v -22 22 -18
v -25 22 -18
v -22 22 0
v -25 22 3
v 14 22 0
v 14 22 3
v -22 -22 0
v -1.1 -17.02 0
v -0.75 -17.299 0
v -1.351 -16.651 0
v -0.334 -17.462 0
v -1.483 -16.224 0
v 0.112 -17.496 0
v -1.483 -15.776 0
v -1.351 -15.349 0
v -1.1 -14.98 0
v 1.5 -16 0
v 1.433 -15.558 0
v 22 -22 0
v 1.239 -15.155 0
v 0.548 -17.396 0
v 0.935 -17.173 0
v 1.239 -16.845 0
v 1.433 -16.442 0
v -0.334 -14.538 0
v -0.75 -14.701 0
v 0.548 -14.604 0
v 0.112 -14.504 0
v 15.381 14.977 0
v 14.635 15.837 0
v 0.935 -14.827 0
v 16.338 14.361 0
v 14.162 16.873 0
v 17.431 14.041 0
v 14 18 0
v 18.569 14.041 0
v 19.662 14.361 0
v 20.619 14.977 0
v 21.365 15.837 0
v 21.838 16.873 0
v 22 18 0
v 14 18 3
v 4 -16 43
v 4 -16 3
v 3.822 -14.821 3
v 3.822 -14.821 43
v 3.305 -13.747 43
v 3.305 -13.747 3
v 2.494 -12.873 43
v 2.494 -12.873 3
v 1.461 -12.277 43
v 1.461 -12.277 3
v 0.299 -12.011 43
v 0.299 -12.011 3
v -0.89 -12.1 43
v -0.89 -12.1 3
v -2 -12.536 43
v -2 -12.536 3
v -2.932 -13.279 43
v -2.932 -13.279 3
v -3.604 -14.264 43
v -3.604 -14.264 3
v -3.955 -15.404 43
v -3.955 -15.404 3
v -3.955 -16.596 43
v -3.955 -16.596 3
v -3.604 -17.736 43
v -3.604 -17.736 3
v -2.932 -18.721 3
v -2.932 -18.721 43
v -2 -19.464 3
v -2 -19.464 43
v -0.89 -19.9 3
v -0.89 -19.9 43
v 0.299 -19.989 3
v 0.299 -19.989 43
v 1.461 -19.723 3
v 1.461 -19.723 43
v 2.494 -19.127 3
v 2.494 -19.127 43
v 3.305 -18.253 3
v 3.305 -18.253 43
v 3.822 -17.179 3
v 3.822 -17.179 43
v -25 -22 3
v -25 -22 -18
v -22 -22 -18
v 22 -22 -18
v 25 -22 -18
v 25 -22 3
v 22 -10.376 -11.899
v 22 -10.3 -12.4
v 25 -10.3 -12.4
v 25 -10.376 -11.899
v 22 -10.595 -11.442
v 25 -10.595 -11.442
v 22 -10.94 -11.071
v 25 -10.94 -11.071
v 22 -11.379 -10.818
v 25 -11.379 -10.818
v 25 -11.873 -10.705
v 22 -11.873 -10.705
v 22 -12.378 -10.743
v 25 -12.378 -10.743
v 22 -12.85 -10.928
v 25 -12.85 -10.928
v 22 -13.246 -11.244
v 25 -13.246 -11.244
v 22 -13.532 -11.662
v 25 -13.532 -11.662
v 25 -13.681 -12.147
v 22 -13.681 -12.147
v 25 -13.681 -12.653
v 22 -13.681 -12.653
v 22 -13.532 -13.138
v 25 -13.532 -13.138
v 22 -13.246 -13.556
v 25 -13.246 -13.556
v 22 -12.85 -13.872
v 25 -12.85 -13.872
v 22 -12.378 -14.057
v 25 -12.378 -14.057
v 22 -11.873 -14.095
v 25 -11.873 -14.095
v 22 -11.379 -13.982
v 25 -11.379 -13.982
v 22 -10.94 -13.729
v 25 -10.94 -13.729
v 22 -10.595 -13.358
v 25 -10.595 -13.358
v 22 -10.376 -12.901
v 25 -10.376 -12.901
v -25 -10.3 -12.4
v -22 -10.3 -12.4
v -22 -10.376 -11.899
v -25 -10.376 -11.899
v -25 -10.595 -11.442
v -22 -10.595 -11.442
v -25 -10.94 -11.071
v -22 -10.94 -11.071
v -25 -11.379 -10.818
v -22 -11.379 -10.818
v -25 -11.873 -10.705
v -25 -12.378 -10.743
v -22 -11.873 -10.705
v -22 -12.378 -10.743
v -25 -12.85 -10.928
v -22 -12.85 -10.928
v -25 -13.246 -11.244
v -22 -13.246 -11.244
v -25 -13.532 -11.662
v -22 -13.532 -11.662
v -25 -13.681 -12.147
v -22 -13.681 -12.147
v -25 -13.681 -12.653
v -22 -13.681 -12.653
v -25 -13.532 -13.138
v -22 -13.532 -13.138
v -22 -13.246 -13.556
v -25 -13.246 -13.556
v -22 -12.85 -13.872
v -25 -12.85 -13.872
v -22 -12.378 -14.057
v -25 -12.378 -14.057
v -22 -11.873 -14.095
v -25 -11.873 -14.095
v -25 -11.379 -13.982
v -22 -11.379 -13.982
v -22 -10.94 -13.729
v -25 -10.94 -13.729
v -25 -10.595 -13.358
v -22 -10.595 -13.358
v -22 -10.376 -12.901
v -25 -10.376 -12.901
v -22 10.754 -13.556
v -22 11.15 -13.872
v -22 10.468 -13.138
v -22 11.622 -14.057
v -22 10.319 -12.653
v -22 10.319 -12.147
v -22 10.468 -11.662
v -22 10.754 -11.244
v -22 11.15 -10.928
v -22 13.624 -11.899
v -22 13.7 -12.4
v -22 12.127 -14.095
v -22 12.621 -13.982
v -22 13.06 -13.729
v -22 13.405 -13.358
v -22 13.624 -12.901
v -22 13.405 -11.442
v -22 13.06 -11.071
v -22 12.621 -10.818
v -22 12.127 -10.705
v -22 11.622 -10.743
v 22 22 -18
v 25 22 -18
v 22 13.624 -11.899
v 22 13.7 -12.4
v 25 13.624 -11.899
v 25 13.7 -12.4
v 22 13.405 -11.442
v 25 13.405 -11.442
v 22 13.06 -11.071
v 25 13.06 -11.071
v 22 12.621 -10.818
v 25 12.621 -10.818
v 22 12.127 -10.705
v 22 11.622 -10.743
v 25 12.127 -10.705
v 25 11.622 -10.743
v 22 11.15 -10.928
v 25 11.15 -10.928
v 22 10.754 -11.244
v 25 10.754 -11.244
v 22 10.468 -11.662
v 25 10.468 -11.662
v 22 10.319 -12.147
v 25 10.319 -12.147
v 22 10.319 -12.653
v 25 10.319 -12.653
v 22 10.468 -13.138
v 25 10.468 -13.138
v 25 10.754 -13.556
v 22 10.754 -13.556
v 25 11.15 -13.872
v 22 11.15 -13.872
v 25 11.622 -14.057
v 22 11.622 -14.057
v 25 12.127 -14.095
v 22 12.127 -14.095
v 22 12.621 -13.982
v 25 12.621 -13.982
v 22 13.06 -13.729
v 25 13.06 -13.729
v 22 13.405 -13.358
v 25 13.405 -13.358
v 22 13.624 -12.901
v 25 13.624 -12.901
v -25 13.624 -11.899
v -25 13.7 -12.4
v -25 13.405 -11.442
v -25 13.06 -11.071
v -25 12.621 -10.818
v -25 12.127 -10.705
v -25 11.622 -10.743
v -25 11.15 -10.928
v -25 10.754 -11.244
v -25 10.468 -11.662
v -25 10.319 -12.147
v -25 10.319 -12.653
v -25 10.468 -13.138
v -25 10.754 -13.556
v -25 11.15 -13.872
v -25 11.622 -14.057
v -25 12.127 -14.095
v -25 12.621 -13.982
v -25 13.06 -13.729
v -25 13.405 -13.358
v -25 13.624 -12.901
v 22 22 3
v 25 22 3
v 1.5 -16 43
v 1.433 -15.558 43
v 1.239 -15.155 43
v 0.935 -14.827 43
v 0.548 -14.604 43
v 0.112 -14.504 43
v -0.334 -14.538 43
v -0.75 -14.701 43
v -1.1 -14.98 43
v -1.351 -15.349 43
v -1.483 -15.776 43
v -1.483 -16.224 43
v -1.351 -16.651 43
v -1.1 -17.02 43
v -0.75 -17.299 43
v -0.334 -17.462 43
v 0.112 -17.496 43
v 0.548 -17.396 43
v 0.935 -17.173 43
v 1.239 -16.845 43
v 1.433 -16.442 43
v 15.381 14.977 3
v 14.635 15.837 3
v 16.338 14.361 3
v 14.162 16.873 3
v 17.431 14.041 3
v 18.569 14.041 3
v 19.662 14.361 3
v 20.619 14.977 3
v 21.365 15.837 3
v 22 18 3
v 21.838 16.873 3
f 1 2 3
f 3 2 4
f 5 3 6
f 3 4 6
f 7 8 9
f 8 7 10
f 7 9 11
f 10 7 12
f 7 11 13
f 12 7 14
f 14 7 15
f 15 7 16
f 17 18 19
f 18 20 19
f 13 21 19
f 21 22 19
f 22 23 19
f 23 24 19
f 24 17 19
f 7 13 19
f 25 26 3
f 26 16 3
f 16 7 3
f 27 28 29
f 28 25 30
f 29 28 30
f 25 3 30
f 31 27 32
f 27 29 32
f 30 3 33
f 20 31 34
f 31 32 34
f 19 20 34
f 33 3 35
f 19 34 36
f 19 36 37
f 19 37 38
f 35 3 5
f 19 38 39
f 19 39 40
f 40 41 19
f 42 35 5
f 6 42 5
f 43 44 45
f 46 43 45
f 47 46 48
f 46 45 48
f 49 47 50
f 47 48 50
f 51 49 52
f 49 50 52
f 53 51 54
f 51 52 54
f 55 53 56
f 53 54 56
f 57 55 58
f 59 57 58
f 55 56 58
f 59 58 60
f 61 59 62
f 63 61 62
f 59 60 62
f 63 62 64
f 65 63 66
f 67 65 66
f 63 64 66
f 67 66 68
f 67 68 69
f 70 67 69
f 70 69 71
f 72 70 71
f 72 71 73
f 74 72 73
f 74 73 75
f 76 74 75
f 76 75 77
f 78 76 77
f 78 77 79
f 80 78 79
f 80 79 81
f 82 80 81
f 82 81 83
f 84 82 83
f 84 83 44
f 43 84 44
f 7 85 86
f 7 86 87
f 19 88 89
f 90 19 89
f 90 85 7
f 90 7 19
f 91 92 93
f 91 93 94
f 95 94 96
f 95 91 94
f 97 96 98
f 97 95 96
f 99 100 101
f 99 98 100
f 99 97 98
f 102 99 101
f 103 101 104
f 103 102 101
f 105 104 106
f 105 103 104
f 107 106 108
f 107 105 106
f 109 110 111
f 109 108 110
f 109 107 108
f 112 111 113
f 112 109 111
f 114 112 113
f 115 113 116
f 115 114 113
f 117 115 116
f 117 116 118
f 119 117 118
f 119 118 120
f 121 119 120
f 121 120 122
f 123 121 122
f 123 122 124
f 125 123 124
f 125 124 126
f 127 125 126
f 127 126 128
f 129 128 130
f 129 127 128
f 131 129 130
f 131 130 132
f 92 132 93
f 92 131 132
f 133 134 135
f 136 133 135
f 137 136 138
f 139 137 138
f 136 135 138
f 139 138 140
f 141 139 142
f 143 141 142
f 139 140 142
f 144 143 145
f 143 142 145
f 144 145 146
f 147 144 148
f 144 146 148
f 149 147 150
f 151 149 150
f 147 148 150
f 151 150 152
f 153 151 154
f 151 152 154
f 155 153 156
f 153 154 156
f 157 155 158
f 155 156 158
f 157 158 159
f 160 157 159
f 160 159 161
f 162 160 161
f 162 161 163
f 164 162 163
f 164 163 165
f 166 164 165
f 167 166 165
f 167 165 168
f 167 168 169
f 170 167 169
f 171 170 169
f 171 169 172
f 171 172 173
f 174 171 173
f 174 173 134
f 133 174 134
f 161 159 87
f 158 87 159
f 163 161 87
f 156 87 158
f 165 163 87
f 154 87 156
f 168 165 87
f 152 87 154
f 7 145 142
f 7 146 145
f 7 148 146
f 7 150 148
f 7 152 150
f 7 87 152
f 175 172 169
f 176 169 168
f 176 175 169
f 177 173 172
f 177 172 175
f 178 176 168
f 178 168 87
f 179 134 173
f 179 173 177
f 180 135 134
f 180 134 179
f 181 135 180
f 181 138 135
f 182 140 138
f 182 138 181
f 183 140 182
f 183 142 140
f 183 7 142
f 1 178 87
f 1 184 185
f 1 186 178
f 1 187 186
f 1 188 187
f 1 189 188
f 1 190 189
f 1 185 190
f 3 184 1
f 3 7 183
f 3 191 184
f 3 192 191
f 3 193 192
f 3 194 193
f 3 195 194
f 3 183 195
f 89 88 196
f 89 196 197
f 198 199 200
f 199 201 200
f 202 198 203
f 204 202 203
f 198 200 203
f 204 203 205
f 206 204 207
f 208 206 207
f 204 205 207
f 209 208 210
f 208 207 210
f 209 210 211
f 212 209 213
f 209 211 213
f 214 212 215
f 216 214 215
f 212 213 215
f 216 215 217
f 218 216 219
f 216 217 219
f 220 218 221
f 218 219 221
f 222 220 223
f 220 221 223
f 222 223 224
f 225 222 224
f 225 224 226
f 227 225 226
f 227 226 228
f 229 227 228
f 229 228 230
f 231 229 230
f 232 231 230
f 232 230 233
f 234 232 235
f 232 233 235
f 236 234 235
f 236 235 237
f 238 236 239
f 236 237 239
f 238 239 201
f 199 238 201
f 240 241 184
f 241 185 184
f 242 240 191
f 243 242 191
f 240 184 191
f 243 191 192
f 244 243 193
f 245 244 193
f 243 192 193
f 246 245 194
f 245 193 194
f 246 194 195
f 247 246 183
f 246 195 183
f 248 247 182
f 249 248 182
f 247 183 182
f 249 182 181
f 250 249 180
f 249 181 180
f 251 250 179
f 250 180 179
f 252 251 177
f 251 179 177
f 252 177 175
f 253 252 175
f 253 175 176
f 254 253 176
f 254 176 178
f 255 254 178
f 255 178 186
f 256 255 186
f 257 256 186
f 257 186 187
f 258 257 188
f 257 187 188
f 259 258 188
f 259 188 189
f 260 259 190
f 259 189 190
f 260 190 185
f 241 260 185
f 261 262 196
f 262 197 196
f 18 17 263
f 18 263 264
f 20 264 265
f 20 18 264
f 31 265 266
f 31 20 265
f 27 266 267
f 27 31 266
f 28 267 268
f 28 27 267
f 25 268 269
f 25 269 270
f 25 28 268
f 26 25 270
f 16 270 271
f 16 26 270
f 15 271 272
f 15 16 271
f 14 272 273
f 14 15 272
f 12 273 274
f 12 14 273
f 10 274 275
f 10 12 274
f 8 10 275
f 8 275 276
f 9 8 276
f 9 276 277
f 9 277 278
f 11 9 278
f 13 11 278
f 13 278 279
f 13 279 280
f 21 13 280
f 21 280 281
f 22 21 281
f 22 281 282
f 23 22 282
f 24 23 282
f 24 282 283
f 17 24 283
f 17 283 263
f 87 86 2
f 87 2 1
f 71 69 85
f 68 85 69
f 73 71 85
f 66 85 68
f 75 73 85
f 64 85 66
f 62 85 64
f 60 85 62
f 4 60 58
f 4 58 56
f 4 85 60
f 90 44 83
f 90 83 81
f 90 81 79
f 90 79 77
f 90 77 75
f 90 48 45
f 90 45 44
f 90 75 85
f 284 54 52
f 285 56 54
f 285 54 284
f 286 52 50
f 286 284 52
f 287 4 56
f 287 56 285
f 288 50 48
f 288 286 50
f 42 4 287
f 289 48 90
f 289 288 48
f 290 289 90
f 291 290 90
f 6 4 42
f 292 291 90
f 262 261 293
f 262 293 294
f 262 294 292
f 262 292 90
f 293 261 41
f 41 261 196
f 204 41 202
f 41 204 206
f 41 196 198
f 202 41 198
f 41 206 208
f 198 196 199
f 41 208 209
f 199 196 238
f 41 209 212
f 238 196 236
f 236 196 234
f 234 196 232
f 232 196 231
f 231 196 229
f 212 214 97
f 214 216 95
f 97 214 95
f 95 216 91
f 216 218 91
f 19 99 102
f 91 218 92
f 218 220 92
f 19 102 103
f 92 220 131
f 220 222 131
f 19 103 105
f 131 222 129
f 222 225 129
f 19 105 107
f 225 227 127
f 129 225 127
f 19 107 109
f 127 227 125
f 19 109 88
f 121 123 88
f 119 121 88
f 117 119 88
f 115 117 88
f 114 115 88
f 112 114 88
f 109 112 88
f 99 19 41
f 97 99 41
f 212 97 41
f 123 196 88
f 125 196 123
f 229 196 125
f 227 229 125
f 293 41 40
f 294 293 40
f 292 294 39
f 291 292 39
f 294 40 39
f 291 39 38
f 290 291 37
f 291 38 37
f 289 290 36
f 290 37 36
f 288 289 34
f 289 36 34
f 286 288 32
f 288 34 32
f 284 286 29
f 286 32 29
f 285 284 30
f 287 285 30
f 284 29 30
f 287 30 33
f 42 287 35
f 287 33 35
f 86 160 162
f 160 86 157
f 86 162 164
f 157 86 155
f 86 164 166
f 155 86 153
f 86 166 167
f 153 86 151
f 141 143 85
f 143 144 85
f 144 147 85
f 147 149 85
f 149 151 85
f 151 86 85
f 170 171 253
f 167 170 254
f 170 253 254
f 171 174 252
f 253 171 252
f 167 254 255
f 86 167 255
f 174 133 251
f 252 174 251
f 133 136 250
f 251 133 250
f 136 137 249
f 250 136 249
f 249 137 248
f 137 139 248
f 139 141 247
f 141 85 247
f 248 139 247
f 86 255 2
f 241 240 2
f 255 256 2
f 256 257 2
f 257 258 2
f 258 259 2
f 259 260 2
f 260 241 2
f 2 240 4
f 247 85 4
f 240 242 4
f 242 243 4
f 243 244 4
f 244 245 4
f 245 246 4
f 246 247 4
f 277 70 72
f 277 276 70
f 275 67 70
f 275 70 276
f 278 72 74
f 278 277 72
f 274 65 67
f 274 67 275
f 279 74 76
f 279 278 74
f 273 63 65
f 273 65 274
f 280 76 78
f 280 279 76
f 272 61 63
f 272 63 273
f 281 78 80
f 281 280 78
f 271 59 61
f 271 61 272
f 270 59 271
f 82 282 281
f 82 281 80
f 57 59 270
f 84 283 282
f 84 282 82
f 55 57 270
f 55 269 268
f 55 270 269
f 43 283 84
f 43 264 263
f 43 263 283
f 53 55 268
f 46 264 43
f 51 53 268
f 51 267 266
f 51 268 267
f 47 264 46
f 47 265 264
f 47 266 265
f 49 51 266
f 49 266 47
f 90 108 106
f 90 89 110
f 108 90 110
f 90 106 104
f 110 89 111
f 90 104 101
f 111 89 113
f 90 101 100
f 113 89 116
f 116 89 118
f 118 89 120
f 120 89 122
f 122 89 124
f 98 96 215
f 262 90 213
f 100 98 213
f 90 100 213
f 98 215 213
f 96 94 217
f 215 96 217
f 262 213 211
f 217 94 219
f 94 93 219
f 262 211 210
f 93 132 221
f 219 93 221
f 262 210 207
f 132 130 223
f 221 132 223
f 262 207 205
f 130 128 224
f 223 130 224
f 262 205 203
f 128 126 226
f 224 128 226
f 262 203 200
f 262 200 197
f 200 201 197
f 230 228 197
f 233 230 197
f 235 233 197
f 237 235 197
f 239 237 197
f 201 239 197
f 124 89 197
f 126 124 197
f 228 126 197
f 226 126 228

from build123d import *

# Parameters (mm, degrees)
F0_R     = 4
F0_W     = 3
F0_H     = 44
F0_R_2   = 1.5
F1_DEPTH = 3
F2_DEPTH = 18
F3_R     = 1.7
F4_DEPTH = 50
F5_DEPTH = 43


# Not quite as in the source:
# - a feature names something its author has since deleted; it is built from what else it names


with BuildPart() as f1:
    # F0 (on Top) → F1 (new body)
    with BuildSketch(Plane.XY):
        with BuildLine():
            Line((14, 22), (-22, 22))
            Line((-22, 22), (-22, -22))
            Line((-22, -22), (22, -22))
            Line((22, -22), (22, 18))
            ThreePointArc((22, 18), (18, 14), (14, 18))
            Line((14, 18), (14, 18.3849148452))
            Line((14, 18.3849148452), (14, 22))
        make_face()
        with Locations((0, -16)):
            Circle(F0_R, mode=Mode.SUBTRACT)
        with Locations((-23.5, 0)):
            Rectangle(F0_W, F0_H)
        Polygon((22, 18), (22, -22), (25, -22), (25, 22), (22, 22), align=None)
        with Locations((0, -16)):
            Circle(F0_R)
        with Locations((0, -16)):
            Circle(F0_R_2, mode=Mode.SUBTRACT)
    extrude(amount=F1_DEPTH)

    # F0 (on Top) → F2 (join)
    with BuildSketch(Plane.XY):
        with Locations((-23.5, 0)):
            Rectangle(F0_W, F0_H)
        Polygon((22, 18), (22, -22), (25, -22), (25, 22), (22, 22), align=None)
    extrude(amount=-F2_DEPTH)

    # F3 (on face) → F4 (cut, symmetric)
    with BuildSketch(Plane.YZ.offset(-22)):
        with Locations((-12, -12.4)):
            Circle(F3_R)
        with Locations((12, -12.4)):
            Circle(F3_R)
    extrude(amount=F4_DEPTH, both=True, mode=Mode.SUBTRACT)

    # F0 (on Top) → F5 (join)
    with BuildSketch(Plane.XY):
        with Locations((0, -16)):
            Circle(F0_R)
        with Locations((0, -16)):
            Circle(F0_R_2, mode=Mode.SUBTRACT)
    extrude(amount=F5_DEPTH)


solid = f1.part
